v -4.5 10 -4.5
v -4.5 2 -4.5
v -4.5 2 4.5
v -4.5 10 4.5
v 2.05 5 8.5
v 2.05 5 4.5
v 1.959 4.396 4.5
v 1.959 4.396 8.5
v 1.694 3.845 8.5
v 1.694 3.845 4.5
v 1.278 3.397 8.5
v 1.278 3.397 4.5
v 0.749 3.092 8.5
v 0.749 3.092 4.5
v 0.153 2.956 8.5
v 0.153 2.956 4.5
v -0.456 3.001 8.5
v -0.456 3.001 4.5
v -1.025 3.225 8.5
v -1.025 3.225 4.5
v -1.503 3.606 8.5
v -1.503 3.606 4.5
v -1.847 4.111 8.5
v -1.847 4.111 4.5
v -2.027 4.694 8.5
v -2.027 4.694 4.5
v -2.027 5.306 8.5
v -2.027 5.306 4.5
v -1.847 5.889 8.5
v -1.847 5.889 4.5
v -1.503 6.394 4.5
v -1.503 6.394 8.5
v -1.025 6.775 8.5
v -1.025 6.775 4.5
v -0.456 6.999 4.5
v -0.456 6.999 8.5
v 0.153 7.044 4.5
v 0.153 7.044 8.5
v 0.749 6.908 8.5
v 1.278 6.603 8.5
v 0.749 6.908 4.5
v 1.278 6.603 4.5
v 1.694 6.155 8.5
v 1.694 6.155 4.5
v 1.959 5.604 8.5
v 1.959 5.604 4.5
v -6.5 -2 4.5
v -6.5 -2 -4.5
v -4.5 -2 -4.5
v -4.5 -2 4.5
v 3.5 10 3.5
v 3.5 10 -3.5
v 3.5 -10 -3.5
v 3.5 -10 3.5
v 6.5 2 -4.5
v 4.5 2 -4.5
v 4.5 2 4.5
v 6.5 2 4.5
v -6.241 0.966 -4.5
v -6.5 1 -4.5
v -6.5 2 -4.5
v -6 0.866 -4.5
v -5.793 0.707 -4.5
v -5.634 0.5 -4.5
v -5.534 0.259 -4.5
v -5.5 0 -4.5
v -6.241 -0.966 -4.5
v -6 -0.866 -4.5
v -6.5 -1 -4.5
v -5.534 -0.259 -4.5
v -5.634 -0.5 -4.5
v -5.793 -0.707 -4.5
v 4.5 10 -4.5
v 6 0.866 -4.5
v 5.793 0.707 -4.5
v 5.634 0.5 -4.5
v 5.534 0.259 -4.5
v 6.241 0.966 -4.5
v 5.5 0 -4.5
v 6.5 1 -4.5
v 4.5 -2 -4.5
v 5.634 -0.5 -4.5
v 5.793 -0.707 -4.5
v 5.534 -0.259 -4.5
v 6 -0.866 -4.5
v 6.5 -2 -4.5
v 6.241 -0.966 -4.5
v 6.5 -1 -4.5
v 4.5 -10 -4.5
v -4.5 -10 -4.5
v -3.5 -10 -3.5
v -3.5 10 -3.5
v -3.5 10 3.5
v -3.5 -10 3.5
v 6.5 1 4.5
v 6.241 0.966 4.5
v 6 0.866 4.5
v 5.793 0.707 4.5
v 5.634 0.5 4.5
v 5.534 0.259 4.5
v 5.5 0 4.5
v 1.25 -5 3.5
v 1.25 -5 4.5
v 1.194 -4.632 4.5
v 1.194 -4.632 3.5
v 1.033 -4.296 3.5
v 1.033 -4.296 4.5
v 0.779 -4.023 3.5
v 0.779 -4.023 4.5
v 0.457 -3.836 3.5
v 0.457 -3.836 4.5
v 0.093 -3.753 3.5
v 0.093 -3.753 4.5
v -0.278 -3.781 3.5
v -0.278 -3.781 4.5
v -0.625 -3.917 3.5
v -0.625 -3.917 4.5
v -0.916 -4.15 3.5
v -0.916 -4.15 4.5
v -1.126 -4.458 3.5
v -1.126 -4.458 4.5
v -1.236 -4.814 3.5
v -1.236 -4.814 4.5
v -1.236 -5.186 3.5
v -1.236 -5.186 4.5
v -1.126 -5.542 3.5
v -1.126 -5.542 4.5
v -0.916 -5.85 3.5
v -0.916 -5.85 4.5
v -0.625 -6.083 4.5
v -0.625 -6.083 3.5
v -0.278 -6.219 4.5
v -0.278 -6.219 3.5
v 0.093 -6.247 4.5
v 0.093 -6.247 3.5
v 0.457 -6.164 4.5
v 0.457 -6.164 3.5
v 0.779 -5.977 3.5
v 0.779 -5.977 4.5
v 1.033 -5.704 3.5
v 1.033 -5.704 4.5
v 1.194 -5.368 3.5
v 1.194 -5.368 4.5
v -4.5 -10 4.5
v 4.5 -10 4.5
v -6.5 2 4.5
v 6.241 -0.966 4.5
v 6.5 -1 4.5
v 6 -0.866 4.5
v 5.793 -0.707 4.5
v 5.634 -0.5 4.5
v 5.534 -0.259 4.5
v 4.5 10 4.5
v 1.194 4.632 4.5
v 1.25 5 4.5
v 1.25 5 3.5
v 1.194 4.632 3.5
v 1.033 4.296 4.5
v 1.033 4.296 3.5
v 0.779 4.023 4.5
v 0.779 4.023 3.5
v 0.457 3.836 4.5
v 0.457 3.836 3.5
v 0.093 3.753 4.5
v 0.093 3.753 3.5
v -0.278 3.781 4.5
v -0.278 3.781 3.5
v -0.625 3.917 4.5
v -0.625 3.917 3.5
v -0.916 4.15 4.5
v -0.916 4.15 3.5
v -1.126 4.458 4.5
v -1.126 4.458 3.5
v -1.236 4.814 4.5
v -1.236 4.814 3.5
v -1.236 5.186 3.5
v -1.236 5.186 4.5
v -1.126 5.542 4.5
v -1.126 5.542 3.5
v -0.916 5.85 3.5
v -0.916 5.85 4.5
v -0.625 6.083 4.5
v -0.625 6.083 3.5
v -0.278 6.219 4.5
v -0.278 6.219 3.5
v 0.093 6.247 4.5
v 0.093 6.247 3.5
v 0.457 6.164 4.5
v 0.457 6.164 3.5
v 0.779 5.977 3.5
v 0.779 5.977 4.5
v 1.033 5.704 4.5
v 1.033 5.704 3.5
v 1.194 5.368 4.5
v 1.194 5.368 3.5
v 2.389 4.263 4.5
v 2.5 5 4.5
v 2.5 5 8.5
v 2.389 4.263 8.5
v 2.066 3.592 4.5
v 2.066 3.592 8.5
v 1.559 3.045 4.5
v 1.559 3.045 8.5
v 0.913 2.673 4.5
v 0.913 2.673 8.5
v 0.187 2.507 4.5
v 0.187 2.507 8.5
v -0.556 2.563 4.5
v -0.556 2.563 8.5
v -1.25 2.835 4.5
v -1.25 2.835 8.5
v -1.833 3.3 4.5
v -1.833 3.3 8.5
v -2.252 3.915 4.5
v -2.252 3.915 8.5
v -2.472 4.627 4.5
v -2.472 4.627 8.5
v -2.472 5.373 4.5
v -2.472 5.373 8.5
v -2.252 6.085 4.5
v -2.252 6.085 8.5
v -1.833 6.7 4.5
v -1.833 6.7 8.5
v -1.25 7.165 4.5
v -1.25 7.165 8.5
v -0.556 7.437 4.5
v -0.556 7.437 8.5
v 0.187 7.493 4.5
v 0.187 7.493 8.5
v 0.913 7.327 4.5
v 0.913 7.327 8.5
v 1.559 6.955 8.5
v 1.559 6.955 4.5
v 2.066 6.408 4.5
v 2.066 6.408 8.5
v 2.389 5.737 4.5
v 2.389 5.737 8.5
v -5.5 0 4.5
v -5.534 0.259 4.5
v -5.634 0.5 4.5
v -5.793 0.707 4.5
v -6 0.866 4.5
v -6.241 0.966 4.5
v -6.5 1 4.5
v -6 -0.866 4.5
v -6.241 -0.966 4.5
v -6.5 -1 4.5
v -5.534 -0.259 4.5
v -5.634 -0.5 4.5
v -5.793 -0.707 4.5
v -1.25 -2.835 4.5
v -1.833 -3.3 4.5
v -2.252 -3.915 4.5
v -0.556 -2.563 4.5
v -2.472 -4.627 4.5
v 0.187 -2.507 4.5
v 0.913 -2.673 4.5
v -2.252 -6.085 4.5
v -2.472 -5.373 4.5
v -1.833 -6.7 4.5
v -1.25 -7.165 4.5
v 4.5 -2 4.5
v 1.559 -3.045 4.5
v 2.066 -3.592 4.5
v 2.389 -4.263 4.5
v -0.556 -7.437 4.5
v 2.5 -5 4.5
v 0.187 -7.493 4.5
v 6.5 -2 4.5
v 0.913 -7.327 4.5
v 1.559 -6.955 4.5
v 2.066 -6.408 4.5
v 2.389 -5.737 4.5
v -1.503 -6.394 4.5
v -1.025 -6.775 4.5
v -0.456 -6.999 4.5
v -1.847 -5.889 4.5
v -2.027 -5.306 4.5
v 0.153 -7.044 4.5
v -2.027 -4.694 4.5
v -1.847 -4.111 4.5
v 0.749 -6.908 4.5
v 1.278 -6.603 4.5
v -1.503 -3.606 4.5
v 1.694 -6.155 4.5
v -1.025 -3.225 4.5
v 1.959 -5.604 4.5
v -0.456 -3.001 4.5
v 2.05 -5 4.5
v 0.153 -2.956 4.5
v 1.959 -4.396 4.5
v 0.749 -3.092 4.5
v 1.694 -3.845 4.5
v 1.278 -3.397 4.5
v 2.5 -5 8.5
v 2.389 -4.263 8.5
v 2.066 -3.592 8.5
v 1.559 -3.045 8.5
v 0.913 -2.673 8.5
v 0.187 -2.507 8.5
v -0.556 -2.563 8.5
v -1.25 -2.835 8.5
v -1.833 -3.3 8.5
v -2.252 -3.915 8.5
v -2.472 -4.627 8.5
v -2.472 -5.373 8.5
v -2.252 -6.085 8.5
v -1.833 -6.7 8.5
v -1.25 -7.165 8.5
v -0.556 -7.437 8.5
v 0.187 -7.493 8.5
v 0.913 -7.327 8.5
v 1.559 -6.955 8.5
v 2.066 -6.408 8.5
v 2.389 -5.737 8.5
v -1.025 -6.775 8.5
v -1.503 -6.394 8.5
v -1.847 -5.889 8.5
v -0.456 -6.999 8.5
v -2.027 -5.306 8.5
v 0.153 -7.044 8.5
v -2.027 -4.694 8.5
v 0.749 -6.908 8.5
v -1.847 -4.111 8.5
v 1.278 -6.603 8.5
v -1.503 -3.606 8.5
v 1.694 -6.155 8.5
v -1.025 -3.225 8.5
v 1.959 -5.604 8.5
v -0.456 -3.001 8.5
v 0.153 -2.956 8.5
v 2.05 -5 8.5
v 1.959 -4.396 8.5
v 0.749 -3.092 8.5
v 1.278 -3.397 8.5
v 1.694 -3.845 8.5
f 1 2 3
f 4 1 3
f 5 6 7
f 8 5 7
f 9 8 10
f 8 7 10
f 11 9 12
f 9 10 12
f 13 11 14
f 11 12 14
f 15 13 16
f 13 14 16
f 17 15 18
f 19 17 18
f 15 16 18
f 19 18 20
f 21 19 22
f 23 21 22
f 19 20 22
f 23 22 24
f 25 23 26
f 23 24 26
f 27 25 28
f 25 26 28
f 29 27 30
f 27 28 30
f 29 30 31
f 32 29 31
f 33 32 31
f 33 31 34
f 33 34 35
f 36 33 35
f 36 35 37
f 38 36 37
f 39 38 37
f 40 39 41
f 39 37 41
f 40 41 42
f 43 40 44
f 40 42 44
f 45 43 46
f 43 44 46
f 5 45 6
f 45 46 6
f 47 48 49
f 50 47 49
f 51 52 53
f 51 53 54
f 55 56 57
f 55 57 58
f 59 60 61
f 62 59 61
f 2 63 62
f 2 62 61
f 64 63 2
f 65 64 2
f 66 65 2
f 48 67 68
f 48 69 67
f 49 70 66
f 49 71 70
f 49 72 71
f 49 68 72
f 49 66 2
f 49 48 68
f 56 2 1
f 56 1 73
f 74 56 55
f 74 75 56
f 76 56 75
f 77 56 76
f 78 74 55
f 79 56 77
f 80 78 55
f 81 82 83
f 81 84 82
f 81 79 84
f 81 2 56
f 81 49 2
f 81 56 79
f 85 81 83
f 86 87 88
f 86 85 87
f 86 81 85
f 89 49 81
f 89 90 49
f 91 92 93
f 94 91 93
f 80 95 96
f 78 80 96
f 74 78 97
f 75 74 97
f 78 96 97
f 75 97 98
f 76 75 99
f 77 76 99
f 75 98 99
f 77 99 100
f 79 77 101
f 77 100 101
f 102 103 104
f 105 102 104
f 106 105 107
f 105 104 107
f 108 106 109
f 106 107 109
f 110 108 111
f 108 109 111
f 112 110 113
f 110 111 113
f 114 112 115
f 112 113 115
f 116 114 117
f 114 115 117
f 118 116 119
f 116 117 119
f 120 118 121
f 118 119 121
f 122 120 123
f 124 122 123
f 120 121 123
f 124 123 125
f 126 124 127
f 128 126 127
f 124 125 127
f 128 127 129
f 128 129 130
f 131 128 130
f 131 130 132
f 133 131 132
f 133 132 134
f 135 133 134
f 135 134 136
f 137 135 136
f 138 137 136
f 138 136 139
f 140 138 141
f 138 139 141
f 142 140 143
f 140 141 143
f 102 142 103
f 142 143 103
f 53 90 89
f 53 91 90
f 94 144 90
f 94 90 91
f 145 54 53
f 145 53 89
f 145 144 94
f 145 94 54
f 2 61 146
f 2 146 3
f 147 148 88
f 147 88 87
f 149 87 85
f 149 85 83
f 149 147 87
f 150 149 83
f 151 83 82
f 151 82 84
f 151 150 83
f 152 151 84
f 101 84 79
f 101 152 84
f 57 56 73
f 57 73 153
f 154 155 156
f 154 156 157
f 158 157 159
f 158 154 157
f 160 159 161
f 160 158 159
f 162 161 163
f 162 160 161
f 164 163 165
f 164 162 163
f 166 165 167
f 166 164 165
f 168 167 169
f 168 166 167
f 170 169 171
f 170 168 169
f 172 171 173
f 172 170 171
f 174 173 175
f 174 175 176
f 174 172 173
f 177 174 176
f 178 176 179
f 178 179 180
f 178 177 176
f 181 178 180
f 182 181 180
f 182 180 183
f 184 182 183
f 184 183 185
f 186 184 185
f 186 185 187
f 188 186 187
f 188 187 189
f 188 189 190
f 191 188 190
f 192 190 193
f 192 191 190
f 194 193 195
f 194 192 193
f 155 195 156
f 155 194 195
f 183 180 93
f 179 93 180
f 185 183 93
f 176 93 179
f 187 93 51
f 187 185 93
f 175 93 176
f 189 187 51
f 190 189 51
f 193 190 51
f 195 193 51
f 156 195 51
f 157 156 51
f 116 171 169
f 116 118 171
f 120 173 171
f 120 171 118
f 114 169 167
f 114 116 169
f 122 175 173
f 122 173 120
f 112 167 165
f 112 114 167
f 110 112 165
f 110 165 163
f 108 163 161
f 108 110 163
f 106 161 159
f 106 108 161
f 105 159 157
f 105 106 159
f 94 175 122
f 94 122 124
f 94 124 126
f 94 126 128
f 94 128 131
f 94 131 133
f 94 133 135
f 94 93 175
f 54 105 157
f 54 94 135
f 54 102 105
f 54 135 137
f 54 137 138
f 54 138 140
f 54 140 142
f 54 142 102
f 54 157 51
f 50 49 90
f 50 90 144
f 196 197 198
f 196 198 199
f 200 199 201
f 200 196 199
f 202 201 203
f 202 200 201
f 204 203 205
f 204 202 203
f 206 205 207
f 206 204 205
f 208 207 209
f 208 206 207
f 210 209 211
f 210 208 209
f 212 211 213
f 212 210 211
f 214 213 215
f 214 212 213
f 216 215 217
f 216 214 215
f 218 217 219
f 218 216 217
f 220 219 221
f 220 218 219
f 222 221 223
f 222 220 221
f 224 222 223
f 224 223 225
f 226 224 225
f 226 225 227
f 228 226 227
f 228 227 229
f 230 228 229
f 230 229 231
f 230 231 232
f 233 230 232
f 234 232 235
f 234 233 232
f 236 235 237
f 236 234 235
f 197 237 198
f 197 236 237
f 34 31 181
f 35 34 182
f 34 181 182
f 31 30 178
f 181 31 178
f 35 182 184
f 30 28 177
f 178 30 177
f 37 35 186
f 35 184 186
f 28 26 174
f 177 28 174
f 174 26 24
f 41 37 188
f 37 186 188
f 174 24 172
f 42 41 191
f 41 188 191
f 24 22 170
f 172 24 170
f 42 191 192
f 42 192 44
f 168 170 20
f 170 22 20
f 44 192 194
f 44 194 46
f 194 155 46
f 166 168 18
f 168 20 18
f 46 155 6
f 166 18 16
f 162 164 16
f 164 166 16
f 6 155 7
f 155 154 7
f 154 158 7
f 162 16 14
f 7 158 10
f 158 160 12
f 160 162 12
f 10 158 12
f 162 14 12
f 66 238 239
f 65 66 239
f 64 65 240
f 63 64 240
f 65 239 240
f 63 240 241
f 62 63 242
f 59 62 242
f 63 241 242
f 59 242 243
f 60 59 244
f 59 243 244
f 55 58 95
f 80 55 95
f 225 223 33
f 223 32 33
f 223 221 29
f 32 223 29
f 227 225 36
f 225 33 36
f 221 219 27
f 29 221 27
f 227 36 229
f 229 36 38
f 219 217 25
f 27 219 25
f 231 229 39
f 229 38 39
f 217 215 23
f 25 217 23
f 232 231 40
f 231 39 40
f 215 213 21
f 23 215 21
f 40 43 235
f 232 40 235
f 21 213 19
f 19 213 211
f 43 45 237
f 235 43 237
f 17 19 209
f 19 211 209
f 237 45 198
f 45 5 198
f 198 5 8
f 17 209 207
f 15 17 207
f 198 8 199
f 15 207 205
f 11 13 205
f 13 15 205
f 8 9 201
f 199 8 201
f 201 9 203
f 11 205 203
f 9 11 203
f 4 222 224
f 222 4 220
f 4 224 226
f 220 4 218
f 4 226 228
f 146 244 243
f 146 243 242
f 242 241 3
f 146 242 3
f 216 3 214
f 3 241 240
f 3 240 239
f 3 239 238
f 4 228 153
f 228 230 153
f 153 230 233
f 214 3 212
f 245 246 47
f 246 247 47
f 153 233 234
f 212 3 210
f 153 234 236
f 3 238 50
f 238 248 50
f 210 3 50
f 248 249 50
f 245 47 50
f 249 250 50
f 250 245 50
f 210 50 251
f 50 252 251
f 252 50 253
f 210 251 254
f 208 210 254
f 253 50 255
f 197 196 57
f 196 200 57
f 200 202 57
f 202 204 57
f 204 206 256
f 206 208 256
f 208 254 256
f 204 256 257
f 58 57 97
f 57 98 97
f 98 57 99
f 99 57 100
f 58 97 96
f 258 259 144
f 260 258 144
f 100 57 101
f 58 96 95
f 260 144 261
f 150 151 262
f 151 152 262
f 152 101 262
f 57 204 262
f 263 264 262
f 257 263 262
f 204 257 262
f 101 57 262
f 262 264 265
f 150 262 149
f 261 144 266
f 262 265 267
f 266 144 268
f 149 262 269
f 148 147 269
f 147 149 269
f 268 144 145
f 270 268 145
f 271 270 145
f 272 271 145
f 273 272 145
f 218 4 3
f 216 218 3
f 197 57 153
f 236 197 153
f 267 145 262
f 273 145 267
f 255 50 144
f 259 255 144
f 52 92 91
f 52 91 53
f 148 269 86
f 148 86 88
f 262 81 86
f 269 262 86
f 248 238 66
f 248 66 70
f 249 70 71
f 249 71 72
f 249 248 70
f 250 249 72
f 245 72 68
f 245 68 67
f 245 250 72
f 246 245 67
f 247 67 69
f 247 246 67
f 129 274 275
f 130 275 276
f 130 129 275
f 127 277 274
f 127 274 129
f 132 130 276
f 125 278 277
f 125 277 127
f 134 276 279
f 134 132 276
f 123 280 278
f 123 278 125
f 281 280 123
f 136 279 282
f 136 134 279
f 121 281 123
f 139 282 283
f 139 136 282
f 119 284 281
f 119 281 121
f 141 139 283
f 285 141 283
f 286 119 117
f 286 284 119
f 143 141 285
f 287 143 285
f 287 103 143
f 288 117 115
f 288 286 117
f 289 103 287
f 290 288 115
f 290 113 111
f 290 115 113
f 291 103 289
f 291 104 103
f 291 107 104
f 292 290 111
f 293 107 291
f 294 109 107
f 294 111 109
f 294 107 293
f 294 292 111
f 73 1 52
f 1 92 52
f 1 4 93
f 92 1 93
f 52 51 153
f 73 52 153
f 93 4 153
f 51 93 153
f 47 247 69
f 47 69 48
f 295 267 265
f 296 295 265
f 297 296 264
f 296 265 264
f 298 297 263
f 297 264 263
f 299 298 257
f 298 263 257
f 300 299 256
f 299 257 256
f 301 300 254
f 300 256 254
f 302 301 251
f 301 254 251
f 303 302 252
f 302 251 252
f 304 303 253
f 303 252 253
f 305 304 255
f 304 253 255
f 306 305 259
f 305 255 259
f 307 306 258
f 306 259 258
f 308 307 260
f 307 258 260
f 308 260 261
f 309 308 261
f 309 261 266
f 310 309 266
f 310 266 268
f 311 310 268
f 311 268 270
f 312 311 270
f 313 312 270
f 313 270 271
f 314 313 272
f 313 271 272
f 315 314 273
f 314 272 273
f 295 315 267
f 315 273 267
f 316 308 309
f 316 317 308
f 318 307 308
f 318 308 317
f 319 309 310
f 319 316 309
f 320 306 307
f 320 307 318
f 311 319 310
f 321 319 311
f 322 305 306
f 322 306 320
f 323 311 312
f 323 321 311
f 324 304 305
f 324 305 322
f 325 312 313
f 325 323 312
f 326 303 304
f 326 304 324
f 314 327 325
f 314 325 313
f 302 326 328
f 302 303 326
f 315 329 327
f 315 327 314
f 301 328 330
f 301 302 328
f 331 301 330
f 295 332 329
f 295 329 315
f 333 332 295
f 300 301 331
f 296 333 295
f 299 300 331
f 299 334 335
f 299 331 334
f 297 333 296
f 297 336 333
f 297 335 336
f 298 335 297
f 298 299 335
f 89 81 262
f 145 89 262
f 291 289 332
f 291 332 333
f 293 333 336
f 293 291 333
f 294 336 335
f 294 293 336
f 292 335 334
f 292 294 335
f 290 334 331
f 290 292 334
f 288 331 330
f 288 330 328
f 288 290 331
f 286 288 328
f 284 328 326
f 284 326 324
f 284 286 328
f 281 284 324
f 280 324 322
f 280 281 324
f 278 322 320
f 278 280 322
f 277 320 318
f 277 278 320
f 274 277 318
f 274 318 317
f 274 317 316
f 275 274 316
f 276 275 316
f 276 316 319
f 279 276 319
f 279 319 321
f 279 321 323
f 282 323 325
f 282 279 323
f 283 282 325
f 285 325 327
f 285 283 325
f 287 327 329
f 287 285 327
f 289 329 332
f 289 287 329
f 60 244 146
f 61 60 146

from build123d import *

# Parameters (mm, degrees)
F0_W     = 9
F0_H     = 9
F0_W_2   = 7
F0_H_2   = 7
F1_DEPTH = 10
F2_R     = 1.25
F3_DEPTH = 1
F4_R     = 2.5
F4_R_2   = 2.05
F5_DEPTH = 4
F7_DEPTH = 9


with BuildPart() as f1:
    # F0 (on Front) → F1 (new body)
    with BuildSketch(Plane.XZ):
        Rectangle(F0_W, F0_H)
        Rectangle(F0_W_2, F0_H_2, mode=Mode.SUBTRACT)
    extrude(amount=F1_DEPTH)

    # F2 (on face) → F3 (cut, through all)
    with BuildSketch(Plane.XY.offset(4.5)):
        with Locations((0, -5)):
            Circle(F2_R)
    extrude(amount=-F3_DEPTH, mode=Mode.SUBTRACT)

    # F4 (on face) → F5 (join)
    with BuildSketch(Plane.XY.offset(4.5)):
        with Locations((0, -5)):
            Circle(F4_R)
        with Locations((0, -5)):
            Circle(F4_R_2, mode=Mode.SUBTRACT)
    extrude(amount=F5_DEPTH)

    # F6 (on face) → F7 (join, through all)
    with BuildSketch(Plane.XY.offset(4.5)):
        with BuildLine():
            Line((-4.5, -2), (-4.5, 0))
            Line((-4.5, 0), (-5.5, 0))
            ThreePointArc((-5.5, 0), (-5.7928932188, -0.7071067812), (-6.5, -1))
            Line((-6.5, -1), (-6.5, -2))
            Line((-6.5, -2), (-4.5, -2))
        make_face()
        with BuildLine():
            Line((5.5, 0), (4.5, 0))
            Line((4.5, 0), (4.5, -2))
            Line((4.5, -2), (6.5, -2))
            Line((6.5, -2), (6.5, -1))
            ThreePointArc((6.5, -1), (5.7928932188, -0.7071067812), (5.5, 0))
        make_face()
    extrude(amount=-F7_DEPTH)

    # F8: F1 across face


with BuildPart() as f1_1:
    add(f1.part)
    add(f1.part.mirror(Plane(origin=(0, 0, 0), x_dir=(-1, 0, 0), z_dir=(0, 1, 0))))


solid = f1_1.part
